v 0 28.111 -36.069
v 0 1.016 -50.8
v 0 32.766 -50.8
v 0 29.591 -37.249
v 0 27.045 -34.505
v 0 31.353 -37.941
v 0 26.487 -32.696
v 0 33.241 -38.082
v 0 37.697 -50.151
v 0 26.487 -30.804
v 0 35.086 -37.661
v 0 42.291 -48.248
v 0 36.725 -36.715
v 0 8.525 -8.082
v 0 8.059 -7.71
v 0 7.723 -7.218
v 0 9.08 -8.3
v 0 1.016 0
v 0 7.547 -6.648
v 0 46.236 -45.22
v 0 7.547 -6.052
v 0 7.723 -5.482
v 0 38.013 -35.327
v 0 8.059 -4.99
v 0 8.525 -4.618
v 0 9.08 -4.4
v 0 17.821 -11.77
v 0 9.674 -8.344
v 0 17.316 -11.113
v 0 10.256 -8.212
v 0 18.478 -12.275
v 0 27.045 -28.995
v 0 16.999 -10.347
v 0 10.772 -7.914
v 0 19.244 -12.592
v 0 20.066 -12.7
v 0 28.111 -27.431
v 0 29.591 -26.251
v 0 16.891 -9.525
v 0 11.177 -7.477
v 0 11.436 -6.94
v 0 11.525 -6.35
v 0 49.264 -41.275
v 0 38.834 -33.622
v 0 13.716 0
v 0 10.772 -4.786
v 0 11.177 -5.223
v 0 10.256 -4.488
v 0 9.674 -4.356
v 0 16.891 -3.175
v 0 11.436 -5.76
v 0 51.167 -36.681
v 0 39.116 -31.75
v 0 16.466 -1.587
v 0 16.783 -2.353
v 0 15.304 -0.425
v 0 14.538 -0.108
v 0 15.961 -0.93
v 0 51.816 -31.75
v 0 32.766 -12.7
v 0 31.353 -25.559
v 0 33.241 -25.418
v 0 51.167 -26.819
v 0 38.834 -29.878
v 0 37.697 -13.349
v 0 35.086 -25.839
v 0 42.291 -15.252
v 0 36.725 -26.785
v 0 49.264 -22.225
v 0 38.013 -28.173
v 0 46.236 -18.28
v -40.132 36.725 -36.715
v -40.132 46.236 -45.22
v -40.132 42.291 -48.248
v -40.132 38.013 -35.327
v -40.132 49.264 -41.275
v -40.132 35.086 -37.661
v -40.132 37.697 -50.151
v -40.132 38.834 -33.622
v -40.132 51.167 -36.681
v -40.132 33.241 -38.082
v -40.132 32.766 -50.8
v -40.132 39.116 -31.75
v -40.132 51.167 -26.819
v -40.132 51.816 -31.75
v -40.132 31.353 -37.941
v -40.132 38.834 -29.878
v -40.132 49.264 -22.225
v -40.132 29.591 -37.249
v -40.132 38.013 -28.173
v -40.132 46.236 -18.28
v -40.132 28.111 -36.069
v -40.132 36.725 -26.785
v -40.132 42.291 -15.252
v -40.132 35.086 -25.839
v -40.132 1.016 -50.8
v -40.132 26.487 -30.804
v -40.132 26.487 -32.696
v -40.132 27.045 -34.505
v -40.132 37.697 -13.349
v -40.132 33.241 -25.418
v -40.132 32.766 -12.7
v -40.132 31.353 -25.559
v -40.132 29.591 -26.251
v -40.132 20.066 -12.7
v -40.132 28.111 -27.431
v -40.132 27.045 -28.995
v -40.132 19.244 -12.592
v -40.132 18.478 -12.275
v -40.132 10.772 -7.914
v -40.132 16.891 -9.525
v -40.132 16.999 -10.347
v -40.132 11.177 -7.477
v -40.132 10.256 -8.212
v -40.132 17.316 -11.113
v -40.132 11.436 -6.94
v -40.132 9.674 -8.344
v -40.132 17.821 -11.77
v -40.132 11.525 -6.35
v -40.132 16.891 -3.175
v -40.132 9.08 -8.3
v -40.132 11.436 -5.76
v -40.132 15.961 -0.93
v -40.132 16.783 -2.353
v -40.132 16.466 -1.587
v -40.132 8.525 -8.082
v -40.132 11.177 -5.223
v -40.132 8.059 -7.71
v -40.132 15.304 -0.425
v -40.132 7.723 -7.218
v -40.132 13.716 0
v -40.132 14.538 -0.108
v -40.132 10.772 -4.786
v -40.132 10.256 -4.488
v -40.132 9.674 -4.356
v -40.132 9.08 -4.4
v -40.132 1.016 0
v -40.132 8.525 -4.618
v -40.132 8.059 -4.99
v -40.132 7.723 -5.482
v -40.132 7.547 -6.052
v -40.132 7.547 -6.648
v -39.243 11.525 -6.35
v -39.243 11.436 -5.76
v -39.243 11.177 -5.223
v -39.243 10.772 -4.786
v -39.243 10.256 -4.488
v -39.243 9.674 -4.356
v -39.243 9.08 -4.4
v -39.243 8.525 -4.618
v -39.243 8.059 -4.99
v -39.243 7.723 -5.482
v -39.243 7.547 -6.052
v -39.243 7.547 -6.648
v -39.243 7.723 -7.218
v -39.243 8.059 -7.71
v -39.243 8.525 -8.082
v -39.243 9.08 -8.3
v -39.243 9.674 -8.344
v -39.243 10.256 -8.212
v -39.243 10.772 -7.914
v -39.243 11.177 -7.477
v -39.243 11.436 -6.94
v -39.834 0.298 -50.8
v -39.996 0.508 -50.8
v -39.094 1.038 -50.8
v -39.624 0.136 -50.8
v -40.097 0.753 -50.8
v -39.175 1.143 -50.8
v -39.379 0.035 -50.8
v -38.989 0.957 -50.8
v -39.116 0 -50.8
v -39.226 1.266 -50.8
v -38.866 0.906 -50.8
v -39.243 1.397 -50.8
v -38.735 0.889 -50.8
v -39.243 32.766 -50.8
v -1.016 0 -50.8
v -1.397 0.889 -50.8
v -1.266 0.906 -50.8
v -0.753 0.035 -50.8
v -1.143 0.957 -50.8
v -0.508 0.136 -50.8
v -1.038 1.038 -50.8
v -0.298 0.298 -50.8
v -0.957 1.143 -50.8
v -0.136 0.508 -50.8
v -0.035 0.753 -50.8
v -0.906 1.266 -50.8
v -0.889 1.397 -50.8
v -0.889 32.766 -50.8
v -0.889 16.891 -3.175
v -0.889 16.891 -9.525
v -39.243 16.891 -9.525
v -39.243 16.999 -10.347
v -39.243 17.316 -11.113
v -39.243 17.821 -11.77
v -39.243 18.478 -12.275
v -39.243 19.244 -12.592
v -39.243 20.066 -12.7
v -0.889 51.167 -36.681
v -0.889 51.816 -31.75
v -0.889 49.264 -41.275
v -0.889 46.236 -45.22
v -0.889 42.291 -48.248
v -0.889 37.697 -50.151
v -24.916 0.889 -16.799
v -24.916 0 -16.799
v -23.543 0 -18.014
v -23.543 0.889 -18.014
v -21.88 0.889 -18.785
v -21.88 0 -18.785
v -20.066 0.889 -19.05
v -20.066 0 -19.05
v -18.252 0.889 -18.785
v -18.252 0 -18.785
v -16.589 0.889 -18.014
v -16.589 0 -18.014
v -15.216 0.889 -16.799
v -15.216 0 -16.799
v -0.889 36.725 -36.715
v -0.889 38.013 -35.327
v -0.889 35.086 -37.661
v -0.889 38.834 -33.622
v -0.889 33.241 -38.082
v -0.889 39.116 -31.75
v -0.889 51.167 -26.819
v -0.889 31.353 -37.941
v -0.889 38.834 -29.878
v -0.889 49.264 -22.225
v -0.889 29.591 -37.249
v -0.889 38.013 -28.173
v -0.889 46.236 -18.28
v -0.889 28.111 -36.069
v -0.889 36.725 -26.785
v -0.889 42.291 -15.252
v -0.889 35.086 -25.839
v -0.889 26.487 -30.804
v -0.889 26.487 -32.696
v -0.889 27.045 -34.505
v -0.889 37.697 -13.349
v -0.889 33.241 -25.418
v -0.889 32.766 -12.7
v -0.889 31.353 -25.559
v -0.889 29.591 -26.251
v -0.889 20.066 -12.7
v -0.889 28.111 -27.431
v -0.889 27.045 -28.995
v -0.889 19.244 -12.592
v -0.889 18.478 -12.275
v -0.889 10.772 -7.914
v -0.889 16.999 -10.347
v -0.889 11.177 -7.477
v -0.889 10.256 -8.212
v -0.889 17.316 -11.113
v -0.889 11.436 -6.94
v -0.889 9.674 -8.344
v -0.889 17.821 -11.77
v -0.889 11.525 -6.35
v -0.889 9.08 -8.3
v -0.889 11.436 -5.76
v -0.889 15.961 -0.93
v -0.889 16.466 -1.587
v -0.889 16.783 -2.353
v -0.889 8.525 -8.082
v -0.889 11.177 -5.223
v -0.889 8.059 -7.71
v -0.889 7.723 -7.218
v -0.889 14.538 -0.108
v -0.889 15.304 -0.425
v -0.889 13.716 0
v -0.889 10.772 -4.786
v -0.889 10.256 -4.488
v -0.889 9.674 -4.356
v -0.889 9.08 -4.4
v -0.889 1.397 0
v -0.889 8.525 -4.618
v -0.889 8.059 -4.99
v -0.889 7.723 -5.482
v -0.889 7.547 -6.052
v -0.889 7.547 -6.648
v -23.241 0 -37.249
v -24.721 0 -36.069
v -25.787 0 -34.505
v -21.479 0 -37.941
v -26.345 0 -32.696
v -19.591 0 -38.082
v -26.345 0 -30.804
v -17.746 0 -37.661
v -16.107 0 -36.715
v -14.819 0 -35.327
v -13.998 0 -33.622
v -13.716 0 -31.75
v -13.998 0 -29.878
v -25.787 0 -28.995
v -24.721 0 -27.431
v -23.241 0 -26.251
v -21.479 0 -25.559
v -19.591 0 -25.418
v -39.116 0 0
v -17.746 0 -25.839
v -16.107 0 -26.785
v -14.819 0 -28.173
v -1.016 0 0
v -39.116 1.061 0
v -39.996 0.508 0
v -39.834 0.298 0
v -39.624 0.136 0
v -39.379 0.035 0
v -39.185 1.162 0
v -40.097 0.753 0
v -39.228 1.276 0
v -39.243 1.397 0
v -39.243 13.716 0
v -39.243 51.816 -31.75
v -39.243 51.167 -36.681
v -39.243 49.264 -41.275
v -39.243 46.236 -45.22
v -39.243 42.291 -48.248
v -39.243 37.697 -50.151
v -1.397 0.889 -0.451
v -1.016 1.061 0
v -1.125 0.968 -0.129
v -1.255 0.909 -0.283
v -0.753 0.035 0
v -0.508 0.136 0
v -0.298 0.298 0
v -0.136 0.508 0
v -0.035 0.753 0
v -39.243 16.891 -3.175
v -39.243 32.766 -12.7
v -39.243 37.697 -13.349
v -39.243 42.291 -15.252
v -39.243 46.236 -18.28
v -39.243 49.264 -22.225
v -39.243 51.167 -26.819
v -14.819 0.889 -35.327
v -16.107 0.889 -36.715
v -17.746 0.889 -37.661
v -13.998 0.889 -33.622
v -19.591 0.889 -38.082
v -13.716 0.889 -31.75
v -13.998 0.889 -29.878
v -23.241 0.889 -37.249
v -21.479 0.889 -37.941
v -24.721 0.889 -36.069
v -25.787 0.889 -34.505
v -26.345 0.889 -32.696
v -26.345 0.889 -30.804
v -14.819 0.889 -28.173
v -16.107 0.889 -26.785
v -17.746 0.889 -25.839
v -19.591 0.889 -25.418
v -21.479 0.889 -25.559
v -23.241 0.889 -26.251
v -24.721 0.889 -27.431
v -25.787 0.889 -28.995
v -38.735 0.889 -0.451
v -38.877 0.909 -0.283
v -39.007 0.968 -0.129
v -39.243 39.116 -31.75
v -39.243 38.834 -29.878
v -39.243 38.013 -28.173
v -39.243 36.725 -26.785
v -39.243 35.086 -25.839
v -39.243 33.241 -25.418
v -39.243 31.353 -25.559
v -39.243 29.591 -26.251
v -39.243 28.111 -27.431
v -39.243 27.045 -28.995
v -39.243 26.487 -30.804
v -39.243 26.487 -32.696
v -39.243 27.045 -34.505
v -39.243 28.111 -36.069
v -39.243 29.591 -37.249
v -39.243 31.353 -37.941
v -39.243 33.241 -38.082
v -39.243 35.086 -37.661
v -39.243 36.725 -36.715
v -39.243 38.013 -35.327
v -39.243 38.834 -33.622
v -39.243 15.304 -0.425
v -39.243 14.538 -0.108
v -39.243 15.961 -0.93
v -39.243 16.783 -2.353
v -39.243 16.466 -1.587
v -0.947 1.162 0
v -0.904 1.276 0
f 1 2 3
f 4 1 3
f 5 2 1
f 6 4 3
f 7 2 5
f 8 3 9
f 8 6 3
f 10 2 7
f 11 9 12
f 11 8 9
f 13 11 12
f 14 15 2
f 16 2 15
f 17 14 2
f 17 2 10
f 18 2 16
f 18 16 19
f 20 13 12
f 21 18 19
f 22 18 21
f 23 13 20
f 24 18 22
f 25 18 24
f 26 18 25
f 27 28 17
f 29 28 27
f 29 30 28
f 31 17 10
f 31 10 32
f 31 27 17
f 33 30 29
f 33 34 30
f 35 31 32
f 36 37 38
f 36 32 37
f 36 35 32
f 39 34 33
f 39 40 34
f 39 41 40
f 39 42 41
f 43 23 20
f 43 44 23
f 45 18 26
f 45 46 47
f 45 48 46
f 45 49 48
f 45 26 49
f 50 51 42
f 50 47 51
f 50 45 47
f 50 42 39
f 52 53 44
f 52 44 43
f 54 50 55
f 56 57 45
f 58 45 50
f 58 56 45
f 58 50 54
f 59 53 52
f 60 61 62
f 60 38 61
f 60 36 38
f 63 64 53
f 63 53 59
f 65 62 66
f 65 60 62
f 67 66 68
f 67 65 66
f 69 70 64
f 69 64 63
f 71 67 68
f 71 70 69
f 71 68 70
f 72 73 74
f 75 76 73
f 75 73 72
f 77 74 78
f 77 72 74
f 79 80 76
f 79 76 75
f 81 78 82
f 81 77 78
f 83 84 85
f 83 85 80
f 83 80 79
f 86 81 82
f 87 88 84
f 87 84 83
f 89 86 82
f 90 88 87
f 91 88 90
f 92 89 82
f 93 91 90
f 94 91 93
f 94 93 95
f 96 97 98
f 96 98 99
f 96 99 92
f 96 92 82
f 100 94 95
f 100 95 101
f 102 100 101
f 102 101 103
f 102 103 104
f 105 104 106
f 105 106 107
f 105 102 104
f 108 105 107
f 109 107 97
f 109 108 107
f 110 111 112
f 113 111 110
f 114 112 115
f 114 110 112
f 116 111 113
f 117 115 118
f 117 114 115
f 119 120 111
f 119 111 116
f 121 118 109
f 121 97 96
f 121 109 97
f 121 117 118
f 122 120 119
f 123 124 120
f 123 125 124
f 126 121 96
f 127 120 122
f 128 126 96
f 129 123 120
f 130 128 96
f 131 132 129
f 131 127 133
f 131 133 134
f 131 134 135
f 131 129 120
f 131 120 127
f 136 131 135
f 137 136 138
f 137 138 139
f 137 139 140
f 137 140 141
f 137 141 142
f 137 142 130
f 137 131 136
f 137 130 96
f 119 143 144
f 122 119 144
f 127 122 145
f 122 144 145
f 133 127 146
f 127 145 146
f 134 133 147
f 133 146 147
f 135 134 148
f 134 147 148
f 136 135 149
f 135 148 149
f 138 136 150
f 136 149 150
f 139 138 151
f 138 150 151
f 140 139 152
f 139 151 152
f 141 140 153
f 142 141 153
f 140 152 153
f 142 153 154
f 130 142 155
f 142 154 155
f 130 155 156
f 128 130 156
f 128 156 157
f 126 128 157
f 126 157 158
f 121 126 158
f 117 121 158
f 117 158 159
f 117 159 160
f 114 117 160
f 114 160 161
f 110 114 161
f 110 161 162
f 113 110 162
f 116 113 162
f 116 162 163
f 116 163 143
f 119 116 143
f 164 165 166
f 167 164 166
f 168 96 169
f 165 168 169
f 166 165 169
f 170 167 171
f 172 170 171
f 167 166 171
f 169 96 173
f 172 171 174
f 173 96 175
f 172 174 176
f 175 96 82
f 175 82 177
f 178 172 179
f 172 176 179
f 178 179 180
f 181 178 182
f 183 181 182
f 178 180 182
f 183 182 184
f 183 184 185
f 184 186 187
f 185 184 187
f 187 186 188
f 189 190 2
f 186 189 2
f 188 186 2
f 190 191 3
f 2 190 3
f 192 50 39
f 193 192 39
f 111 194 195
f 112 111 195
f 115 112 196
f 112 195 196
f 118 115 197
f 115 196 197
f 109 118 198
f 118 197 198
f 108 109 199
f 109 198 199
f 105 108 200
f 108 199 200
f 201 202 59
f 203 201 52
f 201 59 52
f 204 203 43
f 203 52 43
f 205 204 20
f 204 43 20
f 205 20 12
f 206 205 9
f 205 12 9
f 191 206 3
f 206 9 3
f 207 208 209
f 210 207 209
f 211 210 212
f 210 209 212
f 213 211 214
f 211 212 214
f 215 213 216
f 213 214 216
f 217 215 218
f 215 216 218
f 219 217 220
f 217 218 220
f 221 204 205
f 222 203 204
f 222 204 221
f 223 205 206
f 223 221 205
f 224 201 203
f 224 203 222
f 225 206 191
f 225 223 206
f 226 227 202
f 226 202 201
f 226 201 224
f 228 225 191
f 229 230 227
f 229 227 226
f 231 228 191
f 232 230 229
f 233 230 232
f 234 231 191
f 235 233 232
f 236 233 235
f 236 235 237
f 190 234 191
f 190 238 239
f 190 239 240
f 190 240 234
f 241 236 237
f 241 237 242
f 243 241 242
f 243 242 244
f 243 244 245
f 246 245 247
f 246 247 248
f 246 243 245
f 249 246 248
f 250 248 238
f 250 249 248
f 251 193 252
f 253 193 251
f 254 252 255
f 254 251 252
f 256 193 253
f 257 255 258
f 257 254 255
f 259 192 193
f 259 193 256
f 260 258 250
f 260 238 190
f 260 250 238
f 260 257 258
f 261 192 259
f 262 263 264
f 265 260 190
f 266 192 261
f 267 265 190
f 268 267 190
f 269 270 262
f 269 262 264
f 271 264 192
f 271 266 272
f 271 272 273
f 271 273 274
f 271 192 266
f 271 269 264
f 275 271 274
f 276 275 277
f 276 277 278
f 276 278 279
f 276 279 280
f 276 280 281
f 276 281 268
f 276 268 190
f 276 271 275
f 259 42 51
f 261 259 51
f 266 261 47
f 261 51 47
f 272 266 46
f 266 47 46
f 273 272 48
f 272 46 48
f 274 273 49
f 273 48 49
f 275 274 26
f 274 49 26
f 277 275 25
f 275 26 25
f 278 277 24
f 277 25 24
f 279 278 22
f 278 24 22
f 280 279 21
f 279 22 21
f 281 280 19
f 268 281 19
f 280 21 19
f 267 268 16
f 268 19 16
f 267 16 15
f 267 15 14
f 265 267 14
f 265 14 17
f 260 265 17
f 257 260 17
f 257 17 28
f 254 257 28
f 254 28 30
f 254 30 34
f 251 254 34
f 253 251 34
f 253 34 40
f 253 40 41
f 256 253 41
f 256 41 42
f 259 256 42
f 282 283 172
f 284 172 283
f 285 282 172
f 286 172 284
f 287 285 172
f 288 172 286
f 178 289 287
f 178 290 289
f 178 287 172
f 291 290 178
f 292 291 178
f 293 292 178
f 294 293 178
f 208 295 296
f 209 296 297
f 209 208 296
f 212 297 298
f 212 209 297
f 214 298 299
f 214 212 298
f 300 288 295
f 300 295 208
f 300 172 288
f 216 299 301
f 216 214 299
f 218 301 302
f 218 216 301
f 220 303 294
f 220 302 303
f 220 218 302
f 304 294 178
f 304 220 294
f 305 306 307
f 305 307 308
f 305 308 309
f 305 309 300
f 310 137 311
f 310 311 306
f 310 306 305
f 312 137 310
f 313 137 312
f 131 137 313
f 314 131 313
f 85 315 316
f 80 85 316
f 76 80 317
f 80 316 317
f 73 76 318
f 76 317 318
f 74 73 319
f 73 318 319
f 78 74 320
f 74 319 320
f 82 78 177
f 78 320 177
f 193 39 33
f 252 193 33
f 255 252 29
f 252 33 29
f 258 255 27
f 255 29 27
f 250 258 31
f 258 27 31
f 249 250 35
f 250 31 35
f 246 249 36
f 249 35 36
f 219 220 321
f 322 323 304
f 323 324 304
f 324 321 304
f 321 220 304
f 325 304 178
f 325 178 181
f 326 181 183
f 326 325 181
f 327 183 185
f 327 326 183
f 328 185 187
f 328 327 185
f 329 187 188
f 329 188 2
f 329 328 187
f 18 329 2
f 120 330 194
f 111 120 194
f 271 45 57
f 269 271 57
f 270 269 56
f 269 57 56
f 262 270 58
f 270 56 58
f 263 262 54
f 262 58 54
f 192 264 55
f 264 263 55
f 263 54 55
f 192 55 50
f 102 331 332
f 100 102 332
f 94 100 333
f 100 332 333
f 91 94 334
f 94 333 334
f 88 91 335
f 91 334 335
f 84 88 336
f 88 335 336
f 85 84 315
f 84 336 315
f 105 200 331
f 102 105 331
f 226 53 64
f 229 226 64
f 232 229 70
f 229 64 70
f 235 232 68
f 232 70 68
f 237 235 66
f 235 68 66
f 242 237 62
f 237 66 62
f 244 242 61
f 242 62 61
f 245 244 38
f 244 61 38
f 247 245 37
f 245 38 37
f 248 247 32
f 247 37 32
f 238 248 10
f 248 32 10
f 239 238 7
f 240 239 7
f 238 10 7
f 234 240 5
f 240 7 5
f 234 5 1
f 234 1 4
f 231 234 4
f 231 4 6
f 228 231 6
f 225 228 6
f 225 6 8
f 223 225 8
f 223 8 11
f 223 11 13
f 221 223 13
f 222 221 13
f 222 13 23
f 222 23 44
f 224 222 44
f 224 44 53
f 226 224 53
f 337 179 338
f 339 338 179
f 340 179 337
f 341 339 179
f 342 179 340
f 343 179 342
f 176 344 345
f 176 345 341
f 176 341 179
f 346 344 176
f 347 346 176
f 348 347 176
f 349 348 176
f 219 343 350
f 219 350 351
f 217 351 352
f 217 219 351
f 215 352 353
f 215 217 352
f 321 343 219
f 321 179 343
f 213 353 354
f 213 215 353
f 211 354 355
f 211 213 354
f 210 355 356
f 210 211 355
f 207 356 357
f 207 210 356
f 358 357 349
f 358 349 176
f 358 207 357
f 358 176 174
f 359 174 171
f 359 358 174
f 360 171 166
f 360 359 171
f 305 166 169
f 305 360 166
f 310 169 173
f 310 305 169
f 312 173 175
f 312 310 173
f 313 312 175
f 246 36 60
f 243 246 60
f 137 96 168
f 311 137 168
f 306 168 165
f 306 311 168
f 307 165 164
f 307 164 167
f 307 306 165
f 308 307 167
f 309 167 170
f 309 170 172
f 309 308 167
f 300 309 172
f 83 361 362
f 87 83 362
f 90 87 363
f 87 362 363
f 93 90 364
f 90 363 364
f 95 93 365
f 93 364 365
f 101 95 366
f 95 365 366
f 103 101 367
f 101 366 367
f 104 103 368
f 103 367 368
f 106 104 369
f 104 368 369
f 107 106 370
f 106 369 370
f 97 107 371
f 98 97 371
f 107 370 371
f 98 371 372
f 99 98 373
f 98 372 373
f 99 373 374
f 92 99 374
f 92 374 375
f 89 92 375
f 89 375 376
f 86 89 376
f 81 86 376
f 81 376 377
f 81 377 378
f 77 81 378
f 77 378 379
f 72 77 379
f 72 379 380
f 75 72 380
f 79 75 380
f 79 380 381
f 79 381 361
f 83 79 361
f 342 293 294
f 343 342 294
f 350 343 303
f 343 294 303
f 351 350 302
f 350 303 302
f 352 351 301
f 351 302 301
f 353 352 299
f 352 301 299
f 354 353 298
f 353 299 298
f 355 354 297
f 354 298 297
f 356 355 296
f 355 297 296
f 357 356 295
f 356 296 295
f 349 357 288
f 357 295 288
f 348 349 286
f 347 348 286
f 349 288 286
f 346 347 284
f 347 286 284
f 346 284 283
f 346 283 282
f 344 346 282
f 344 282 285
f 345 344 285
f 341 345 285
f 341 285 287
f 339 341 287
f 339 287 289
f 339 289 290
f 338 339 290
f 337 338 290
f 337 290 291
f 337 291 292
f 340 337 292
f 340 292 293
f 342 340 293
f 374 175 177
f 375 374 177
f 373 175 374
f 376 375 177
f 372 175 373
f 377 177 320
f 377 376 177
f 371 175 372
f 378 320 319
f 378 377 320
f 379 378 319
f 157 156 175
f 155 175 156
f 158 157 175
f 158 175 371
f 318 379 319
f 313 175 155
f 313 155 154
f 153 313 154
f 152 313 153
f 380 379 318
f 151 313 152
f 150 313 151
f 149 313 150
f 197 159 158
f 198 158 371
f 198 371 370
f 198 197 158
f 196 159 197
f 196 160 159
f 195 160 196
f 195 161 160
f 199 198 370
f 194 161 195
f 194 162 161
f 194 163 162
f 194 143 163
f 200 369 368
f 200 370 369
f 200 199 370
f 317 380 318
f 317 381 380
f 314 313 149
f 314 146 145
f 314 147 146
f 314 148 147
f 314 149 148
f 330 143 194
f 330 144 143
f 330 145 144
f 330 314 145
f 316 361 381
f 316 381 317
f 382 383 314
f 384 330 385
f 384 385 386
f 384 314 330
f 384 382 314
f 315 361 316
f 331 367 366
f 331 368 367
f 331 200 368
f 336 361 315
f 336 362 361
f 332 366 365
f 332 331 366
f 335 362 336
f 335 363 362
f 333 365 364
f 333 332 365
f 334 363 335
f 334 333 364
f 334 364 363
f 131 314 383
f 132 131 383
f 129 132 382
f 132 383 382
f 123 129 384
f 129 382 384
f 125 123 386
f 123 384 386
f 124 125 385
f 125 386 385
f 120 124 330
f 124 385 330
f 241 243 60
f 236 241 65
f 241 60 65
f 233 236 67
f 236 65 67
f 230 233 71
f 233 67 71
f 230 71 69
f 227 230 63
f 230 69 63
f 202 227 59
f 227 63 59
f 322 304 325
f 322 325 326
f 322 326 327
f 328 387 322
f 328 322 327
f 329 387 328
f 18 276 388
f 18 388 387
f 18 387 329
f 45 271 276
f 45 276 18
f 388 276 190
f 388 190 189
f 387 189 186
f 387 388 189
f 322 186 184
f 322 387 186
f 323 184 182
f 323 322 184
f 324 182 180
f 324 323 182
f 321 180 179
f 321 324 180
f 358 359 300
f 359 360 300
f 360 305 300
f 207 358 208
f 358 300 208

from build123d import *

# Parameters (mm, degrees)
F1_DEPTH = 50.8
F2_R     = 6.35
F3_DEPTH = 25.4
F4_R     = 6.35
F4_R_2   = 2
F5_DEPTH = 40.133


# Not quite as in the source:
# - a feature names something its author has since deleted; it is built from what else it names


with BuildPart() as f1:
    # F0 (on Top) → F1 (new body)
    with BuildSketch(Plane.XY):
        with BuildLine():
            Line((-39.116, 0), (-1.016, 0))
            ThreePointArc((-1.016, 0), (-0.2975795103, 0.2975795103), (0, 1.016))
            Line((0, 1.016), (0, 51.816))
            Line((0, 51.816), (-0.889, 51.816))
            Line((-0.889, 51.816), (-0.889, 1.397))
            ThreePointArc((-0.889, 1.397), (-1.0377897552, 1.0377897552), (-1.397, 0.889))
            Line((-1.397, 0.889), (-38.735, 0.889))
            ThreePointArc((-38.735, 0.889), (-39.0942102448, 1.0377897552), (-39.243, 1.397))
            Line((-39.243, 1.397), (-39.243, 51.816))
            Line((-39.243, 51.816), (-40.132, 51.816))
            Line((-40.132, 51.816), (-40.132, 1.016))
            ThreePointArc((-40.132, 1.016), (-39.8344204897, 0.2975795103), (-39.116, 0))
        make_face()
    extrude(amount=-F1_DEPTH)

    # F2 (on face) → F3 (cut)
    with BuildSketch(Plane.XZ):
        with Locations((-20.066, -31.75)):
            Circle(F2_R)
        with BuildLine():
            Line((-39.116, 0), (-24.915545424, -16.799318136))
            ThreePointArc((-24.915545424, -16.799318136), (-20.066, -19.05), (-15.216454576, -16.799318136))
            Line((-15.216454576, -16.799318136), (-1.016, 0))
            Line((-1.016, 0), (-39.116, 0))
        make_face()
    extrude(amount=-F3_DEPTH, mode=Mode.SUBTRACT)

    # F4 (on face) → F5 (cut, through all)
    with BuildSketch(Plane.YZ):
        with BuildLine():
            ThreePointArc((51.816, -31.75), (46.2363841816, -45.2203841816), (32.766, -50.8))
            Line((32.766, -50.8), (51.816, -50.8))
            Line((51.816, -50.8), (51.816, -31.75))
        make_face()
        with Locations((32.766, -31.75)):
            Circle(F4_R)
        with BuildLine():
            ThreePointArc((32.766, -12.7), (46.2363841816, -18.2796158184), (51.816, -31.75))
            Line((51.816, -31.75), (51.816, 0))
            Line((51.816, 0), (13.716, 0))
            ThreePointArc((13.716, 0), (15.9610640303, -0.9299359697), (16.891, -3.175))
            Line((16.891, -3.175), (16.891, -9.525))
            ThreePointArc((16.891, -9.525), (17.8209359697, -11.7700640303), (20.066, -12.7))
            Line((20.066, -12.7), (32.766, -12.7))
        make_face()
        with Locations((9.525, -6.35)):
            Circle(F4_R_2)
    extrude(amount=-F5_DEPTH, mode=Mode.SUBTRACT)


solid = f1.part
